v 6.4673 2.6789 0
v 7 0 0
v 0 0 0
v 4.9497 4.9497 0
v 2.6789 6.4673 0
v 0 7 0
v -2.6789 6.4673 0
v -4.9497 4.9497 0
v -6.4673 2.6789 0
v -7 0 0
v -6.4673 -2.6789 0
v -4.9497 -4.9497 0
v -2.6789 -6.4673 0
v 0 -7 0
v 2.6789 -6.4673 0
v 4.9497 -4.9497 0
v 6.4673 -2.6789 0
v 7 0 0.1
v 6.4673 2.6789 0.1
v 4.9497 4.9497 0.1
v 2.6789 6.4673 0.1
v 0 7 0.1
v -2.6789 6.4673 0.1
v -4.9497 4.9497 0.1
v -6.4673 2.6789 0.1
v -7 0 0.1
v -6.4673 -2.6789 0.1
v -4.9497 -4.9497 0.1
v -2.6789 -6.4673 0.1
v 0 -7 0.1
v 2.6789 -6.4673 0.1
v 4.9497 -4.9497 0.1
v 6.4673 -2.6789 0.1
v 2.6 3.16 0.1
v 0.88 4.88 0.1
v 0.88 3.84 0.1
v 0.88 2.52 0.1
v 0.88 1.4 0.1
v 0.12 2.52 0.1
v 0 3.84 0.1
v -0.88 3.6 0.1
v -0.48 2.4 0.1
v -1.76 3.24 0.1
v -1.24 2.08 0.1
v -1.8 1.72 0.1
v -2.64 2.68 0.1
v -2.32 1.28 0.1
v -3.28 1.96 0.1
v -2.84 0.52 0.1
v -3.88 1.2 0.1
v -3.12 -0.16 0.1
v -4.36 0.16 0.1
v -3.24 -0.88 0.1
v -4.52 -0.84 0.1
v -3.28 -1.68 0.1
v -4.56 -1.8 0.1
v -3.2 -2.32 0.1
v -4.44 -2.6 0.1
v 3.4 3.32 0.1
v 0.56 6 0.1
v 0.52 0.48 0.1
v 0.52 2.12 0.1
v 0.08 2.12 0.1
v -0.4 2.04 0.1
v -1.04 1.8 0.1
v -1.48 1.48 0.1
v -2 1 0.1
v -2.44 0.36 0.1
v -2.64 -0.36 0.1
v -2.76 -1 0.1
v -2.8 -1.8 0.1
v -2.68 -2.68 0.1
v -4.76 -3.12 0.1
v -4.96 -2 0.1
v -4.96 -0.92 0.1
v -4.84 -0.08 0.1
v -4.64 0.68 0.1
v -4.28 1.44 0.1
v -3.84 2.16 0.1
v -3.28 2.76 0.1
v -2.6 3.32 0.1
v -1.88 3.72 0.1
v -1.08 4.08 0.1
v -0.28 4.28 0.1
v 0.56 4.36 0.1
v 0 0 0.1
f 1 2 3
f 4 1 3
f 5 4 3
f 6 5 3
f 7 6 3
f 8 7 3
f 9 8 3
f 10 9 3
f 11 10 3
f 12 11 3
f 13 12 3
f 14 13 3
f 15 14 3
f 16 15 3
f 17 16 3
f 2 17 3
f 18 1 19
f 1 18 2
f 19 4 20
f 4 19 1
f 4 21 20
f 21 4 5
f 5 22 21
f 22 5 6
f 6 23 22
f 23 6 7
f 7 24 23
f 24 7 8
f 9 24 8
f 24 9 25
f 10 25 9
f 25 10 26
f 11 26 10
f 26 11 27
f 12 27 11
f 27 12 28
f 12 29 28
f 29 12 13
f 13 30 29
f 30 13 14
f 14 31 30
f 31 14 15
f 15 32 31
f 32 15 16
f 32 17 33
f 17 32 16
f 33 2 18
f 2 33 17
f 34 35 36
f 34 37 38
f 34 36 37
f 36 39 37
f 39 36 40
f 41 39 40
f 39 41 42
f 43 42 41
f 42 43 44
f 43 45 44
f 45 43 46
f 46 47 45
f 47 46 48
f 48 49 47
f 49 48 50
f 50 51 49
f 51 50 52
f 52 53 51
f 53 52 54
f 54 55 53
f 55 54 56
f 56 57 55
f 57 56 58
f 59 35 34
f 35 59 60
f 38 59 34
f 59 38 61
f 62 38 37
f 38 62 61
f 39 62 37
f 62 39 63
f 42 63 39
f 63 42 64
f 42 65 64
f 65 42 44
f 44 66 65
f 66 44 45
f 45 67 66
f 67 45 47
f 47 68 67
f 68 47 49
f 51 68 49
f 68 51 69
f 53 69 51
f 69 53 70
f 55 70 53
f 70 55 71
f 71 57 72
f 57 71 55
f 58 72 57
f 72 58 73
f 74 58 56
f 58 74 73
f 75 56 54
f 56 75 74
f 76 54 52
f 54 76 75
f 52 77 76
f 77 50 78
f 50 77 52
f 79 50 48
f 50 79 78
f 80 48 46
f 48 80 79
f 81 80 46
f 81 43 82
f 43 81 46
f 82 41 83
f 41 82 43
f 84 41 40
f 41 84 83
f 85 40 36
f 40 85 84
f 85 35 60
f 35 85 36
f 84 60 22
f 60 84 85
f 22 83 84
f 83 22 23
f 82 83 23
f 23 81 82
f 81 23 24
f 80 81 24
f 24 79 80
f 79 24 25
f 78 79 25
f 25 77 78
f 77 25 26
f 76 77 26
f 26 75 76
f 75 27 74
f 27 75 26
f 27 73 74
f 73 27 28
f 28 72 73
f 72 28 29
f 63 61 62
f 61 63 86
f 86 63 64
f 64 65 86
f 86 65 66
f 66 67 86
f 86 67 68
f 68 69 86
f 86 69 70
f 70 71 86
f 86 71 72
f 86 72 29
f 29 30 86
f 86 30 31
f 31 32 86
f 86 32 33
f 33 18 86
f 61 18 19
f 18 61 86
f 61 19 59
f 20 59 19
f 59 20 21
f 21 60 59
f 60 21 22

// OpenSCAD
// file: ../p/empty.scad
use <../lib.scad>
function ldraw_lib__empty() = [
// 0 Empty
// 0 Name: empty.dat
// 0 Author: Steffen [Steffen]
// 0 !LDRAW_ORG Primitive UPDATE 2015-01
// 0 !LICENSE Licensed under CC BY 2.0 and CC BY 4.0 : see CAreadme.txt
// 
// 0 BFC CERTIFY CCW
  [0,"BFC","CERTIFY"],
  [0,"BFC","CCW"],
// 
// 0 !HISTORY 2015-10-11 [PTadmin] Official Update 2015-01
// 
// 
// 0 // Tool MLCad cannot handle really empty files. This file is used as a workaround.
// 0 // It exceptionally contains forbidden non-LDRAW standard syntax to satisfy MLCad until it is fixed OR a different editor has become the de-facto LDRAW standard.
// 0 // The line being used here is an "impossible" conditional line which never should be visible,
// 0 // additionally hidden by a syntax explicitly hiding it from displaying.
// 
// 0 MLCAD HIDE 5 24 0 0 0 0.0001 0 0 0.0001 -0.0001 0 0 0 0
];
makepoly(ldraw_lib__empty(), line=0.2);
// file: ../p/1-16chrd.scad
use <../lib.scad>
use <empty.scad>
function ldraw_lib__1_16chrd() = [
// 0 Chord 0.0625
// 0 Name: 1-16chrd.dat
// 0 Author: Philippe Hurbain [Philo]
// 0 !LDRAW_ORG Primitive UPDATE 2015-01
// 0 !LICENSE Licensed under CC BY 2.0 and CC BY 4.0 : see CAreadme.txt
// 
// 0 BFC CERTIFY CCW
  [0,"BFC","CERTIFY"],
  [0,"BFC","CCW"],
// 
// 0 !HISTORY 2015-10-11 [PTadmin] Official Update 2015-01
// 
// 
// 0 // This file is intentionally empty because at the current \P resolution,
// 0 // an 1-16chrd is actually empty. However, this file still is present
// 0 // to allow tools to do primitives substition and fill in a real chrd here,
// 0 // or, if desired, to substitute this with the hi-res 48\1-16chrd.
// 
// 0 // This file is based on an idea by Darats at http://forums.ldraw.org/read.php?19,14500,14500#msg-14500
// 
// 1 16 0 0 0 1 0 0 0 1 0 0 0 1 empty.dat
  [1,16,0,0,0,1,0,0,0,1,0,0,0,1, ldraw_lib__empty()],
];
makepoly(ldraw_lib__1_16chrd(), line=0.2);
// file: ../p/4-4disc.scad
use <../lib.scad>
function ldraw_lib__4_4disc() = [
// 0 Disc 1.0
// 0 Name: 4-4disc.dat
// 0 Author: James Jessiman
// 0 !LDRAW_ORG Primitive UPDATE 2002-02
// 0 !LICENSE Licensed under CC BY 2.0 and CC BY 4.0 : see CAreadme.txt
// 
// 0 BFC CERTIFY CCW
  [0,"BFC","CERTIFY"],
  [0,"BFC","CCW"],
// 
// 0 !HISTORY 1998-12-15 [PTadmin] Official Update 1998-10
// 0 !HISTORY 2002-03-23 [sbliss] Added BFC statement
// 0 !HISTORY 2002-04-25 [PTadmin] Official Update 2002-02
// 0 !HISTORY 2007-06-24 [PTadmin] Header formatted for Contributor Agreement
// 0 !HISTORY 2008-07-01 [PTadmin] Official Update 2008-01
// 
// 
// 3 16 0 0 0 1 0 0 0.9239 0 0.3827
  [3,16,0,0,0,1,0,0,0.9239,0,0.3827],
// 3 16 0 0 0 0.9239 0 0.3827 0.7071 0 0.7071
  [3,16,0,0,0,0.9239,0,0.3827,0.7071,0,0.7071],
// 3 16 0 0 0 0.7071 0 0.7071 0.3827 0 0.9239
  [3,16,0,0,0,0.7071,0,0.7071,0.3827,0,0.9239],
// 3 16 0 0 0 0.3827 0 0.9239 0 0 1
  [3,16,0,0,0,0.3827,0,0.9239,0,0,1],
// 3 16 0 0 0 0 0 1 -0.3827 0 0.9239
  [3,16,0,0,0,0,0,1,-0.3827,0,0.9239],
// 3 16 0 0 0 -0.3827 0 0.9239 -0.7071 0 0.7071
  [3,16,0,0,0,-0.3827,0,0.9239,-0.7071,0,0.7071],
// 3 16 0 0 0 -0.7071 0 0.7071 -0.9239 0 0.3827
  [3,16,0,0,0,-0.7071,0,0.7071,-0.9239,0,0.3827],
// 3 16 0 0 0 -0.9239 0 0.3827 -1 0 -0
  [3,16,0,0,0,-0.9239,0,0.3827,-1,0,-0],
// 3 16 0 0 0 -1 0 -0 -0.9239 0 -0.3827
  [3,16,0,0,0,-1,0,-0,-0.9239,0,-0.3827],
// 3 16 0 0 0 -0.9239 0 -0.3827 -0.7071 0 -0.7071
  [3,16,0,0,0,-0.9239,0,-0.3827,-0.7071,0,-0.7071],
// 3 16 0 0 0 -0.7071 0 -0.7071 -0.3827 0 -0.9239
  [3,16,0,0,0,-0.7071,0,-0.7071,-0.3827,0,-0.9239],
// 3 16 0 0 0 -0.3827 0 -0.9239 0 0 -1
  [3,16,0,0,0,-0.3827,0,-0.9239,0,0,-1],
// 3 16 0 0 0 0 0 -1 0.3827 0 -0.9239
  [3,16,0,0,0,0,0,-1,0.3827,0,-0.9239],
// 3 16 0 0 0 0.3827 0 -0.9239 0.7071 0 -0.7071
  [3,16,0,0,0,0.3827,0,-0.9239,0.7071,0,-0.7071],
// 3 16 0 0 0 0.7071 0 -0.7071 0.9239 0 -0.3827
  [3,16,0,0,0,0.7071,0,-0.7071,0.9239,0,-0.3827],
// 3 16 0 0 0 0.9239 0 -0.3827 1 0 0
  [3,16,0,0,0,0.9239,0,-0.3827,1,0,0],
// 0
];
makepoly(ldraw_lib__4_4disc(), line=0.2);
// file: ../p/4-4cyli.scad
use <../lib.scad>
function ldraw_lib__4_4cyli() = [
// 0 Cylinder 1.0
// 0 Name: 4-4cyli.dat
// 0 Author: James Jessiman
// 0 !LDRAW_ORG Primitive UPDATE 2005-01
// 0 !LICENSE Licensed under CC BY 2.0 and CC BY 4.0 : see CAreadme.txt
// 
// 0 BFC CERTIFY CCW
  [0,"BFC","CERTIFY"],
  [0,"BFC","CCW"],
// 
// 0 !HISTORY 1998-12-15 [PTadmin] Official Update 1998-10
// 0 !HISTORY 2002-03-23 [sbliss] Added BFC statement; merged headers from files in distributions LDraw 0.27 and Complete.
// 0 !HISTORY 2002-04-25 [PTadmin] Official Update 2002-02
// 0 !HISTORY 2004-12-14 [guyvivan] BFC CCW
// 0 !HISTORY 2005-12-28 [PTadmin] Official Update 2005-01
// 0 !HISTORY 2007-06-24 [PTadmin] Header formatted for Contributor Agreement
// 0 !HISTORY 2008-07-01 [PTadmin] Official Update 2008-01
// 
// 
// 4 16 1 1 0 0.9239 1 0.3827 0.9239 0 0.3827 1 0 0
  [4,16,1,1,0,0.9239,1,0.3827,0.9239,0,0.3827,1,0,0],
// 5 24 1 0 0 1 1 0 0.9239 0 0.3827 0.9239 0 -0.3827
  [5,24,1,0,0,1,1,0,0.9239,0,0.3827,0.9239,0,-0.3827],
// 4 16 0.9239 1 0.3827 0.7071 1 0.7071 0.7071 0 0.7071 0.9239 0 0.3827
  [4,16,0.9239,1,0.3827,0.7071,1,0.7071,0.7071,0,0.7071,0.9239,0,0.3827],
// 5 24 0.9239 0 0.3827 0.9239 1 0.3827 0.7071 0 0.7071 1 0 0
  [5,24,0.9239,0,0.3827,0.9239,1,0.3827,0.7071,0,0.7071,1,0,0],
// 4 16 0.7071 1 0.7071 0.3827 1 0.9239 0.3827 0 0.9239 0.7071 0 0.7071
  [4,16,0.7071,1,0.7071,0.3827,1,0.9239,0.3827,0,0.9239,0.7071,0,0.7071],
// 5 24 0.7071 0 0.7071 0.7071 1 0.7071 0.3827 0 0.9239 0.9239 0 0.3827
  [5,24,0.7071,0,0.7071,0.7071,1,0.7071,0.3827,0,0.9239,0.9239,0,0.3827],
// 4 16 0.3827 1 0.9239 0 1 1 0 0 1 0.3827 0 0.9239
  [4,16,0.3827,1,0.9239,0,1,1,0,0,1,0.3827,0,0.9239],
// 5 24 0.3827 0 0.9239 0.3827 1 0.9239 0 0 1 0.7071 0 0.7071
  [5,24,0.3827,0,0.9239,0.3827,1,0.9239,0,0,1,0.7071,0,0.7071],
// 4 16 0 1 1 -0.3827 1 0.9239 -0.3827 0 0.9239 0 0 1
  [4,16,0,1,1,-0.3827,1,0.9239,-0.3827,0,0.9239,0,0,1],
// 5 24 0 0 1 0 1 1 -0.3827 0 0.9239 0.3827 0 0.9239
  [5,24,0,0,1,0,1,1,-0.3827,0,0.9239,0.3827,0,0.9239],
// 4 16 -0.3827 1 0.9239 -0.7071 1 0.7071 -0.7071 0 0.7071 -0.3827 0 0.9239
  [4,16,-0.3827,1,0.9239,-0.7071,1,0.7071,-0.7071,0,0.7071,-0.3827,0,0.9239],
// 5 24 -0.3827 0 0.9239 -0.3827 1 0.9239 -0.7071 0 0.7071 0 0 1
  [5,24,-0.3827,0,0.9239,-0.3827,1,0.9239,-0.7071,0,0.7071,0,0,1],
// 4 16 -0.7071 1 0.7071 -0.9239 1 0.3827 -0.9239 0 0.3827 -0.7071 0 0.7071
  [4,16,-0.7071,1,0.7071,-0.9239,1,0.3827,-0.9239,0,0.3827,-0.7071,0,0.7071],
// 5 24 -0.7071 0 0.7071 -0.7071 1 0.7071 -0.9239 0 0.3827 -0.3827 0 0.9239
  [5,24,-0.7071,0,0.7071,-0.7071,1,0.7071,-0.9239,0,0.3827,-0.3827,0,0.9239],
// 4 16 -0.9239 1 0.3827 -1 1 0 -1 0 0 -0.9239 0 0.3827
  [4,16,-0.9239,1,0.3827,-1,1,0,-1,0,0,-0.9239,0,0.3827],
// 5 24 -0.9239 0 0.3827 -0.9239 1 0.3827 -1 0 0 -0.7071 0 0.7071
  [5,24,-0.9239,0,0.3827,-0.9239,1,0.3827,-1,0,0,-0.7071,0,0.7071],
// 4 16 -1 1 0 -0.9239 1 -0.3827 -0.9239 0 -0.3827 -1 0 0
  [4,16,-1,1,0,-0.9239,1,-0.3827,-0.9239,0,-0.3827,-1,0,0],
// 5 24 -1 0 0 -1 1 0 -0.9239 0 -0.3827 -0.9239 0 0.3827
  [5,24,-1,0,0,-1,1,0,-0.9239,0,-0.3827,-0.9239,0,0.3827],
// 4 16 -0.9239 1 -0.3827 -0.7071 1 -0.7071 -0.7071 0 -0.7071 -0.9239 0 -0.3827
  [4,16,-0.9239,1,-0.3827,-0.7071,1,-0.7071,-0.7071,0,-0.7071,-0.9239,0,-0.3827],
// 5 24 -0.9239 0 -0.3827 -0.9239 1 -0.3827 -0.7071 0 -0.7071 -1 0 0
  [5,24,-0.9239,0,-0.3827,-0.9239,1,-0.3827,-0.7071,0,-0.7071,-1,0,0],
// 4 16 -0.7071 1 -0.7071 -0.3827 1 -0.9239 -0.3827 0 -0.9239 -0.7071 0 -0.7071
  [4,16,-0.7071,1,-0.7071,-0.3827,1,-0.9239,-0.3827,0,-0.9239,-0.7071,0,-0.7071],
// 5 24 -0.7071 0 -0.7071 -0.7071 1 -0.7071 -0.3827 0 -0.9239 -0.9239 0 -0.3827
  [5,24,-0.7071,0,-0.7071,-0.7071,1,-0.7071,-0.3827,0,-0.9239,-0.9239,0,-0.3827],
// 4 16 -0.3827 1 -0.9239 0 1 -1 0 0 -1 -0.3827 0 -0.9239
  [4,16,-0.3827,1,-0.9239,0,1,-1,0,0,-1,-0.3827,0,-0.9239],
// 5 24 -0.3827 0 -0.9239 -0.3827 1 -0.9239 0 0 -1 -0.7071 0 -0.7071
  [5,24,-0.3827,0,-0.9239,-0.3827,1,-0.9239,0,0,-1,-0.7071,0,-0.7071],
// 4 16 0 1 -1 0.3827 1 -0.9239 0.3827 0 -0.9239 0 0 -1
  [4,16,0,1,-1,0.3827,1,-0.9239,0.3827,0,-0.9239,0,0,-1],
// 5 24 0 0 -1 0 1 -1 0.3827 0 -0.9239 -0.3827 0 -0.9239
  [5,24,0,0,-1,0,1,-1,0.3827,0,-0.9239,-0.3827,0,-0.9239],
// 4 16 0.3827 1 -0.9239 0.7071 1 -0.7071 0.7071 0 -0.7071 0.3827 0 -0.9239
  [4,16,0.3827,1,-0.9239,0.7071,1,-0.7071,0.7071,0,-0.7071,0.3827,0,-0.9239],
// 5 24 0.3827 0 -0.9239 0.3827 1 -0.9239 0.7071 0 -0.7071 0 0 -1
  [5,24,0.3827,0,-0.9239,0.3827,1,-0.9239,0.7071,0,-0.7071,0,0,-1],
// 4 16 0.7071 1 -0.7071 0.9239 1 -0.3827 0.9239 0 -0.3827 0.7071 0 -0.7071
  [4,16,0.7071,1,-0.7071,0.9239,1,-0.3827,0.9239,0,-0.3827,0.7071,0,-0.7071],
// 5 24 0.7071 0 -0.7071 0.7071 1 -0.7071 0.9239 0 -0.3827 0.3827 0 -0.9239
  [5,24,0.7071,0,-0.7071,0.7071,1,-0.7071,0.9239,0,-0.3827,0.3827,0,-0.9239],
// 4 16 0.9239 1 -0.3827 1 1 0 1 0 0 0.9239 0 -0.3827
  [4,16,0.9239,1,-0.3827,1,1,0,1,0,0,0.9239,0,-0.3827],
// 5 24 0.9239 0 -0.3827 0.9239 1 -0.3827 1 0 0 0.7071 0 -0.7071
  [5,24,0.9239,0,-0.3827,0.9239,1,-0.3827,1,0,0,0.7071,0,-0.7071],
// 0
];
makepoly(ldraw_lib__4_4cyli(), line=0.2);
// file: ../p/4-4ering.scad
use <../lib.scad>
use <1-16chrd.scad>
function ldraw_lib__4_4ering() = [
// 0 Adapter Ring Triangles to Normal 1.0
// 0 Name: 4-4ering.dat
// 0 Author: Philippe Hurbain [Philo]
// 0 !LDRAW_ORG Primitive UPDATE 2015-01
// 0 !LICENSE Licensed under CC BY 2.0 and CC BY 4.0 : see CAreadme.txt
// 
// 0 BFC CERTIFY CCW
  [0,"BFC","CERTIFY"],
  [0,"BFC","CCW"],
// 
// 0 !HISTORY 2015-10-11 [PTadmin] Official Update 2015-01
// 
// 
// 0 // This file uses 1-16chrd (actually empty). It allows
// 0 // tools to do primitives substition and fill in a ring of chrd here,
// 0 // or, if desired, to substitute this with the hi-res 48\1-16chrd.
// 0 // This file is based on an idea by Darats at http://forums.ldraw.org/read.php?19,14500,14500#msg-14500
// 
// 1 16 0 0 0 1 0 0 0 1 0 0 0 1 1-16chrd.dat
  [1,16,0,0,0,1,0,0,0,1,0,0,0,1, ldraw_lib__1_16chrd()],
// 1 16 0 0 0 0.92388 0 0.38268 0 1 0 -0.38268 0 0.92388 1-16chrd.dat
  [1,16,0,0,0,0.92388,0,0.38268,0,1,0,-0.38268,0,0.92388, ldraw_lib__1_16chrd()],
// 1 16 0 0 0 0.70711 0 0.70711 0 1 0 -0.70711 0 0.70711 1-16chrd.dat
  [1,16,0,0,0,0.70711,0,0.70711,0,1,0,-0.70711,0,0.70711, ldraw_lib__1_16chrd()],
// 1 16 0 0 0 0.38268 0 0.92388 0 1 0 -0.92388 0 0.38268 1-16chrd.dat
  [1,16,0,0,0,0.38268,0,0.92388,0,1,0,-0.92388,0,0.38268, ldraw_lib__1_16chrd()],
// 1 16 0 0 0 0 0 1 0 1 0 -1 0 0 1-16chrd.dat
  [1,16,0,0,0,0,0,1,0,1,0,-1,0,0, ldraw_lib__1_16chrd()],
// 1 16 0 0 0 -0.38268 0 0.92388 0 1 0 -0.92388 0 -0.38268 1-16chrd.dat
  [1,16,0,0,0,-0.38268,0,0.92388,0,1,0,-0.92388,0,-0.38268, ldraw_lib__1_16chrd()],
// 1 16 0 0 0 -0.70711 0 0.70711 0 1 0 -0.70711 0 -0.70711 1-16chrd.dat
  [1,16,0,0,0,-0.70711,0,0.70711,0,1,0,-0.70711,0,-0.70711, ldraw_lib__1_16chrd()],
// 1 16 0 0 0 -0.92388 0 0.38268 0 1 0 -0.38268 0 -0.92388 1-16chrd.dat
  [1,16,0,0,0,-0.92388,0,0.38268,0,1,0,-0.38268,0,-0.92388, ldraw_lib__1_16chrd()],
// 1 16 0 0 0 0 0 -1 0 1 0 1 0 0 1-16chrd.dat
  [1,16,0,0,0,0,0,-1,0,1,0,1,0,0, ldraw_lib__1_16chrd()],
// 1 16 0 0 0 0.38268 0 -0.92388 0 1 0 0.92388 0 0.38268 1-16chrd.dat
  [1,16,0,0,0,0.38268,0,-0.92388,0,1,0,0.92388,0,0.38268, ldraw_lib__1_16chrd()],
// 1 16 0 0 0 0.70711 0 -0.70711 0 1 0 0.70711 0 0.70711 1-16chrd.dat
  [1,16,0,0,0,0.70711,0,-0.70711,0,1,0,0.70711,0,0.70711, ldraw_lib__1_16chrd()],
// 1 16 0 0 0 0.92388 0 -0.38268 0 1 0 0.38268 0 0.92388 1-16chrd.dat
  [1,16,0,0,0,0.92388,0,-0.38268,0,1,0,0.38268,0,0.92388, ldraw_lib__1_16chrd()],
// 1 16 0 0 0 -1 0 0 0 1 0 0 0 -1 1-16chrd.dat
  [1,16,0,0,0,-1,0,0,0,1,0,0,0,-1, ldraw_lib__1_16chrd()],
// 1 16 0 0 0 -0.92388 0 -0.38268 0 1 0 0.38268 0 -0.92388 1-16chrd.dat
  [1,16,0,0,0,-0.92388,0,-0.38268,0,1,0,0.38268,0,-0.92388, ldraw_lib__1_16chrd()],
// 1 16 0 0 0 -0.70711 0 -0.70711 0 1 0 0.70711 0 -0.70711 1-16chrd.dat
  [1,16,0,0,0,-0.70711,0,-0.70711,0,1,0,0.70711,0,-0.70711, ldraw_lib__1_16chrd()],
// 1 16 0 0 0 -0.38268 0 -0.92388 0 1 0 0.92388 0 -0.38268 1-16chrd.dat
  [1,16,0,0,0,-0.38268,0,-0.92388,0,1,0,0.92388,0,-0.38268, ldraw_lib__1_16chrd()],
];
makepoly(ldraw_lib__4_4ering(), line=0.2);
// file: ../p/4-4cylc3.scad
use <../lib.scad>
use <4-4cyli.scad>
use <4-4disc.scad>
function ldraw_lib__4_4cylc3() = [
// 0 Cylinder Closed 1.0 without Top or Bottom Edge Lines
// 0 Name: 4-4cylc3.dat
// 0 Author: Chris Dee [cwdee]
// 0 !LDRAW_ORG Primitive UPDATE 2017-01
// 0 !LICENSE Licensed under CC BY 2.0 and CC BY 4.0 : see CAreadme.txt
// 
// 0 BFC CERTIFY CCW
  [0,"BFC","CERTIFY"],
  [0,"BFC","CCW"],
// 
// 0 !HISTORY 2017-12-30 [PTadmin] Official Update 2017-01
// 
// 
// 1 16 0 0 0 1 0 0 0 1 0 0 0 1 4-4disc.dat
  [1,16,0,0,0,1,0,0,0,1,0,0,0,1, ldraw_lib__4_4disc()],
// 1 16 0 0 0 1 0 0 0 1 0 0 0 1 4-4cyli.dat
  [1,16,0,0,0,1,0,0,0,1,0,0,0,1, ldraw_lib__4_4cyli()],
// 0
];
makepoly(ldraw_lib__4_4cylc3(), line=0.2);
// main file
use <../lib.scad>
use <../p/4-4cylc3.scad>
use <../p/4-4ering.scad>
function ldraw_lib__59826g() = [
// 0 Sticker  1.75 x  1.75 Round with Quarter Circle Arrow
// 0 Name: 59826g.dat
// 0 Author: J.C. Tchang [tchang]
// 0 !LDRAW_ORG Part UPDATE 2018-02
// 0 !LICENSE Licensed under CC BY 2.0 and CC BY 4.0 : see CAreadme.txt
// 
// 0 BFC CERTIFY CW
  [0,"BFC","CERTIFY"],
  [0,"BFC","CW"],
// 
// 0 !HISTORY 2014-06-21 [PTadmin] Official Update 2014-01
// 0 !HISTORY 2017-07-03 [cwdee] Use cylinder primitive with conditional lines
// 0 !HISTORY 2017-08-19 [MagFors] added a 4-4ering
// 0 !HISTORY 2018-12-08 [PTadmin] Official Update 2018-02
// 
// 
// 1 16 0 0 0 17.5 0 0 0 -0.25 0 0 0 17.5 4-4cylc3.dat
  [1,16,0,0,0,17.5,0,0,0,-0.25,0,0,0,17.5, ldraw_lib__4_4cylc3()],
// 
// 3 1 2.2 -0.25 9.6 2.2 -0.25 12.2 6.5 -0.25 7.9
  [3,1,2.2,-0.25,9.6,2.2,-0.25,12.2,6.5,-0.25,7.9],
// 3 1 2.2 -0.25 3.5 2.2 -0.25 6.3 6.5 -0.25 7.9
  [3,1,2.2,-0.25,3.5,2.2,-0.25,6.3,6.5,-0.25,7.9],
// 3 1 2.2 -0.25 6.3 2.2 -0.25 9.6 6.5 -0.25 7.9
  [3,1,2.2,-0.25,6.3,2.2,-0.25,9.6,6.5,-0.25,7.9],
// 4 1 2.2 -0.25 6.3 0.3 -0.25 6.3 0 -0.25 9.6 2.2 -0.25 9.6
  [4,1,2.2,-0.25,6.3,0.3,-0.25,6.3,0,-0.25,9.6,2.2,-0.25,9.6],
// 4 1 0.3 -0.25 6.3 -1.2 -0.25 6 -2.2 -0.25 9 0 -0.25 9.6
  [4,1,0.3,-0.25,6.3,-1.2,-0.25,6,-2.2,-0.25,9,0,-0.25,9.6],
// 4 1 -3.1 -0.25 5.2 -4.4 -0.25 8.1 -2.2 -0.25 9 -1.2 -0.25 6
  [4,1,-3.1,-0.25,5.2,-4.4,-0.25,8.1,-2.2,-0.25,9,-1.2,-0.25,6],
// 4 1 -3.1 -0.25 5.2 -4.5 -0.25 4.3 -6.6 -0.25 6.7 -4.4 -0.25 8.1
  [4,1,-3.1,-0.25,5.2,-4.5,-0.25,4.3,-6.6,-0.25,6.7,-4.4,-0.25,8.1],
// 4 1 -4.5 -0.25 4.3 -5.8 -0.25 3.2 -8.2 -0.25 4.9 -6.6 -0.25 6.7
  [4,1,-4.5,-0.25,4.3,-5.8,-0.25,3.2,-8.2,-0.25,4.9,-6.6,-0.25,6.7],
// 4 1 -7.1 -0.25 1.3 -9.7 -0.25 3 -8.2 -0.25 4.9 -5.8 -0.25 3.2
  [4,1,-7.1,-0.25,1.3,-9.7,-0.25,3,-8.2,-0.25,4.9,-5.8,-0.25,3.2],
// 4 1 -7.8 -0.25 -0.4 -10.9 -0.25 0.4 -9.7 -0.25 3 -7.1 -0.25 1.3
  [4,1,-7.8,-0.25,-0.4,-10.9,-0.25,0.4,-9.7,-0.25,3,-7.1,-0.25,1.3],
// 4 1 -8.1 -0.25 -2.2 -11.3 -0.25 -2.1 -10.9 -0.25 0.4 -7.8 -0.25 -0.4
  [4,1,-8.1,-0.25,-2.2,-11.3,-0.25,-2.1,-10.9,-0.25,0.4,-7.8,-0.25,-0.4],
// 4 1 -8.2 -0.25 -4.2 -11.4 -0.25 -4.5 -11.3 -0.25 -2.1 -8.1 -0.25 -2.2
  [4,1,-8.2,-0.25,-4.2,-11.4,-0.25,-4.5,-11.3,-0.25,-2.1,-8.1,-0.25,-2.2],
// 4 1 -8 -0.25 -5.8 -11.1 -0.25 -6.5 -11.4 -0.25 -4.5 -8.2 -0.25 -4.2
  [4,1,-8,-0.25,-5.8,-11.1,-0.25,-6.5,-11.4,-0.25,-4.5,-8.2,-0.25,-4.2],
// 4 15 8.5 -0.25 8.3 6.5 -0.25 7.9 2.2 -0.25 12.2 1.4 -0.25 15
  [4,15,8.5,-0.25,8.3,6.5,-0.25,7.9,2.2,-0.25,12.2,1.4,-0.25,15],
// 4 15 8.5 -0.25 8.3 1.3 -0.25 1.2 2.2 -0.25 3.5 6.5 -0.25 7.9
  [4,15,8.5,-0.25,8.3,1.3,-0.25,1.2,2.2,-0.25,3.5,6.5,-0.25,7.9],
// 4 15 1.3 -0.25 5.3 2.2 -0.25 6.3 2.2 -0.25 3.5 1.3 -0.25 1.2
  [4,15,1.3,-0.25,5.3,2.2,-0.25,6.3,2.2,-0.25,3.5,1.3,-0.25,1.2],
// 4 15 2.2 -0.25 6.3 1.3 -0.25 5.3 0.2 -0.25 5.3 0.3 -0.25 6.3
  [4,15,2.2,-0.25,6.3,1.3,-0.25,5.3,0.2,-0.25,5.3,0.3,-0.25,6.3],
// 4 15 0.3 -0.25 6.3 0.2 -0.25 5.3 -1 -0.25 5.1 -1.2 -0.25 6
  [4,15,0.3,-0.25,6.3,0.2,-0.25,5.3,-1,-0.25,5.1,-1.2,-0.25,6],
// 4 15 -1 -0.25 5.1 -2.6 -0.25 4.5 -3.1 -0.25 5.2 -1.2 -0.25 6
  [4,15,-1,-0.25,5.1,-2.6,-0.25,4.5,-3.1,-0.25,5.2,-1.2,-0.25,6],
// 4 15 -3.1 -0.25 5.2 -2.6 -0.25 4.5 -3.7 -0.25 3.7 -4.5 -0.25 4.3
  [4,15,-3.1,-0.25,5.2,-2.6,-0.25,4.5,-3.7,-0.25,3.7,-4.5,-0.25,4.3],
// 4 15 -4.5 -0.25 4.3 -3.7 -0.25 3.7 -5 -0.25 2.5 -5.8 -0.25 3.2
  [4,15,-4.5,-0.25,4.3,-3.7,-0.25,3.7,-5,-0.25,2.5,-5.8,-0.25,3.2],
// 4 15 -5.8 -0.25 3.2 -5 -0.25 2.5 -6.1 -0.25 0.9 -7.1 -0.25 1.3
  [4,15,-5.8,-0.25,3.2,-5,-0.25,2.5,-6.1,-0.25,0.9,-7.1,-0.25,1.3],
// 4 15 -7.1 -0.25 1.3 -6.1 -0.25 0.9 -6.6 -0.25 -0.9 -7.8 -0.25 -0.4
  [4,15,-7.1,-0.25,1.3,-6.1,-0.25,0.9,-6.6,-0.25,-0.9,-7.8,-0.25,-0.4],
// 4 15 -7.8 -0.25 -0.4 -6.6 -0.25 -0.9 -6.9 -0.25 -2.5 -8.1 -0.25 -2.2
  [4,15,-7.8,-0.25,-0.4,-6.6,-0.25,-0.9,-6.9,-0.25,-2.5,-8.1,-0.25,-2.2],
// 4 15 -8.1 -0.25 -2.2 -6.9 -0.25 -2.5 -7 -0.25 -4.5 -8.2 -0.25 -4.2
  [4,15,-8.1,-0.25,-2.2,-6.9,-0.25,-2.5,-7,-0.25,-4.5,-8.2,-0.25,-4.2],
// 4 15 -8.2 -0.25 -4.2 -7 -0.25 -4.5 -6.7 -0.25 -6.7 -8 -0.25 -5.8
  [4,15,-8.2,-0.25,-4.2,-7,-0.25,-4.5,-6.7,-0.25,-6.7,-8,-0.25,-5.8],
// 4 15 -8 -0.25 -5.8 -6.7 -0.25 -6.7 -11.9 -0.25 -7.8 -11.1 -0.25 -6.5
  [4,15,-8,-0.25,-5.8,-6.7,-0.25,-6.7,-11.9,-0.25,-7.8,-11.1,-0.25,-6.5],
// 4 15 -11.1 -0.25 -6.5 -11.9 -0.25 -7.8 -12.4 -0.25 -5 -11.4 -0.25 -4.5
  [4,15,-11.1,-0.25,-6.5,-11.9,-0.25,-7.8,-12.4,-0.25,-5,-11.4,-0.25,-4.5],
// 4 15 -11.4 -0.25 -4.5 -12.4 -0.25 -5 -12.4 -0.25 -2.3 -11.3 -0.25 -2.1
  [4,15,-11.4,-0.25,-4.5,-12.4,-0.25,-5,-12.4,-0.25,-2.3,-11.3,-0.25,-2.1],
// 4 15 -11.3 -0.25 -2.1 -12.4 -0.25 -2.3 -12.1 -0.25 -0.2 -10.9 -0.25 0.4
  [4,15,-11.3,-0.25,-2.1,-12.4,-0.25,-2.3,-12.1,-0.25,-0.2,-10.9,-0.25,0.4],
// 3 15 -12.1 -0.25 -0.2 -11.6 -0.25 1.7 -10.9 -0.25 0.4
  [3,15,-12.1,-0.25,-0.2,-11.6,-0.25,1.7,-10.9,-0.25,0.4],
// 4 15 -9.7 -0.25 3 -10.9 -0.25 0.4 -11.6 -0.25 1.7 -10.7 -0.25 3.6
  [4,15,-9.7,-0.25,3,-10.9,-0.25,0.4,-11.6,-0.25,1.7,-10.7,-0.25,3.6],
// 4 15 -8.2 -0.25 4.9 -9.7 -0.25 3 -10.7 -0.25 3.6 -9.6 -0.25 5.4
  [4,15,-8.2,-0.25,4.9,-9.7,-0.25,3,-10.7,-0.25,3.6,-9.6,-0.25,5.4],
// 4 15 -6.6 -0.25 6.7 -8.2 -0.25 4.9 -9.6 -0.25 5.4 -8.2 -0.25 6.9
  [4,15,-6.6,-0.25,6.7,-8.2,-0.25,4.9,-9.6,-0.25,5.4,-8.2,-0.25,6.9],
// 3 15 -6.6 -0.25 6.7 -8.2 -0.25 6.9 -6.5 -0.25 8.3
  [3,15,-6.6,-0.25,6.7,-8.2,-0.25,6.9,-6.5,-0.25,8.3],
// 4 15 -4.4 -0.25 8.1 -6.6 -0.25 6.7 -6.5 -0.25 8.3 -4.7 -0.25 9.3
  [4,15,-4.4,-0.25,8.1,-6.6,-0.25,6.7,-6.5,-0.25,8.3,-4.7,-0.25,9.3],
// 4 15 -2.2 -0.25 9 -4.4 -0.25 8.1 -4.7 -0.25 9.3 -2.7 -0.25 10.2
  [4,15,-2.2,-0.25,9,-4.4,-0.25,8.1,-4.7,-0.25,9.3,-2.7,-0.25,10.2],
// 4 15 0 -0.25 9.6 -2.2 -0.25 9 -2.7 -0.25 10.2 -0.7 -0.25 10.7
  [4,15,0,-0.25,9.6,-2.2,-0.25,9,-2.7,-0.25,10.2,-0.7,-0.25,10.7],
// 4 15 2.2 -0.25 9.6 0 -0.25 9.6 -0.7 -0.25 10.7 1.4 -0.25 10.9
  [4,15,2.2,-0.25,9.6,0,-0.25,9.6,-0.7,-0.25,10.7,1.4,-0.25,10.9],
// 4 15 2.2 -0.25 12.2 2.2 -0.25 9.6 1.4 -0.25 10.9 1.4 -0.25 15
  [4,15,2.2,-0.25,12.2,2.2,-0.25,9.6,1.4,-0.25,10.9,1.4,-0.25,15],
// 4 7 -0.7 -0.25 10.7 0 -0.25 17.5 1.4 -0.25 15 1.4 -0.25 10.9
  [4,7,-0.7,-0.25,10.7,0,-0.25,17.5,1.4,-0.25,15,1.4,-0.25,10.9],
// 4 7 0 -0.25 17.5 -0.7 -0.25 10.7 -2.7 -0.25 10.2 -6.6972 -0.25 16.1682
  [4,7,0,-0.25,17.5,-0.7,-0.25,10.7,-2.7,-0.25,10.2,-6.6972,-0.25,16.1682],
// 3 7 -6.6972 -0.25 16.1682 -2.7 -0.25 10.2 -4.7 -0.25 9.3
  [3,7,-6.6972,-0.25,16.1682,-2.7,-0.25,10.2,-4.7,-0.25,9.3],
// 4 7 -6.6972 -0.25 16.1682 -4.7 -0.25 9.3 -6.5 -0.25 8.3 -12.3743 -0.25 12.3743
  [4,7,-6.6972,-0.25,16.1682,-4.7,-0.25,9.3,-6.5,-0.25,8.3,-12.3743,-0.25,12.3743],
// 3 7 -12.3743 -0.25 12.3743 -6.5 -0.25 8.3 -8.2 -0.25 6.9
  [3,7,-12.3743,-0.25,12.3743,-6.5,-0.25,8.3,-8.2,-0.25,6.9],
// 4 7 -12.3743 -0.25 12.3743 -8.2 -0.25 6.9 -9.6 -0.25 5.4 -16.1682 -0.25 6.6972
  [4,7,-12.3743,-0.25,12.3743,-8.2,-0.25,6.9,-9.6,-0.25,5.4,-16.1682,-0.25,6.6972],
// 3 7 -16.1682 -0.25 6.6972 -9.6 -0.25 5.4 -10.7 -0.25 3.6
  [3,7,-16.1682,-0.25,6.6972,-9.6,-0.25,5.4,-10.7,-0.25,3.6],
// 4 7 -17.5 -0.25 0 -16.1682 -0.25 6.6972 -10.7 -0.25 3.6 -11.6 -0.25 1.7
  [4,7,-17.5,-0.25,0,-16.1682,-0.25,6.6972,-10.7,-0.25,3.6,-11.6,-0.25,1.7],
// 3 7 -17.5 -0.25 0 -11.6 -0.25 1.7 -12.1 -0.25 -0.2
  [3,7,-17.5,-0.25,0,-11.6,-0.25,1.7,-12.1,-0.25,-0.2],
// 3 7 -12.1 -0.25 -0.2 -12.4 -0.25 -2.3 -17.5 -0.25 0
  [3,7,-12.1,-0.25,-0.2,-12.4,-0.25,-2.3,-17.5,-0.25,0],
// 4 7 -16.1682 -0.25 -6.6972 -17.5 -0.25 0 -12.4 -0.25 -2.3 -12.4 -0.25 -5
  [4,7,-16.1682,-0.25,-6.6972,-17.5,-0.25,0,-12.4,-0.25,-2.3,-12.4,-0.25,-5],
// 4 7 -16.1682 -0.25 -6.6972 -12.4 -0.25 -5 -11.9 -0.25 -7.8 -12.3743 -0.25 -12.3743
  [4,7,-16.1682,-0.25,-6.6972,-12.4,-0.25,-5,-11.9,-0.25,-7.8,-12.3743,-0.25,-12.3743],
// 4 7 -6.6972 -0.25 -16.1682 -12.3743 -0.25 -12.3743 -11.9 -0.25 -7.8 -6.7 -0.25 -6.7
  [4,7,-6.6972,-0.25,-16.1682,-12.3743,-0.25,-12.3743,-11.9,-0.25,-7.8,-6.7,-0.25,-6.7],
// 4 7 0.2 -0.25 5.3 1.3 -0.25 5.3 1.3 -0.25 1.2 0 -0.25 0
  [4,7,0.2,-0.25,5.3,1.3,-0.25,5.3,1.3,-0.25,1.2,0,-0.25,0],
// 3 7 -1 -0.25 5.1 0.2 -0.25 5.3 0 -0.25 0
  [3,7,-1,-0.25,5.1,0.2,-0.25,5.3,0,-0.25,0],
// 3 7 0 -0.25 0 -2.6 -0.25 4.5 -1 -0.25 5.1
  [3,7,0,-0.25,0,-2.6,-0.25,4.5,-1,-0.25,5.1],
// 3 7 -3.7 -0.25 3.7 -2.6 -0.25 4.5 0 -0.25 0
  [3,7,-3.7,-0.25,3.7,-2.6,-0.25,4.5,0,-0.25,0],
// 3 7 0 -0.25 0 -5 -0.25 2.5 -3.7 -0.25 3.7
  [3,7,0,-0.25,0,-5,-0.25,2.5,-3.7,-0.25,3.7],
// 3 7 -6.1 -0.25 0.9 -5 -0.25 2.5 0 -0.25 0
  [3,7,-6.1,-0.25,0.9,-5,-0.25,2.5,0,-0.25,0],
// 3 7 0 -0.25 0 -6.6 -0.25 -0.9 -6.1 -0.25 0.9
  [3,7,0,-0.25,0,-6.6,-0.25,-0.9,-6.1,-0.25,0.9],
// 3 7 -6.9 -0.25 -2.5 -6.6 -0.25 -0.9 0 -0.25 0
  [3,7,-6.9,-0.25,-2.5,-6.6,-0.25,-0.9,0,-0.25,0],
// 3 7 0 -0.25 0 -7 -0.25 -4.5 -6.9 -0.25 -2.5
  [3,7,0,-0.25,0,-7,-0.25,-4.5,-6.9,-0.25,-2.5],
// 3 7 -6.7 -0.25 -6.7 -7 -0.25 -4.5 0 -0.25 0
  [3,7,-6.7,-0.25,-6.7,-7,-0.25,-4.5,0,-0.25,0],
// 3 7 -6.6972 -0.25 -16.1682 -6.7 -0.25 -6.7 0 -0.25 0
  [3,7,-6.6972,-0.25,-16.1682,-6.7,-0.25,-6.7,0,-0.25,0],
// 3 7 0 -0.25 0 0 -0.25 -17.5 -6.6972 -0.25 -16.1682
  [3,7,0,-0.25,0,0,-0.25,-17.5,-6.6972,-0.25,-16.1682],
// 3 7 6.6972 -0.25 -16.1682 0 -0.25 -17.5 0 -0.25 0
  [3,7,6.6972,-0.25,-16.1682,0,-0.25,-17.5,0,-0.25,0],
// 3 7 0 -0.25 0 12.3743 -0.25 -12.3743 6.6972 -0.25 -16.1682
  [3,7,0,-0.25,0,12.3743,-0.25,-12.3743,6.6972,-0.25,-16.1682],
// 3 7 16.1682 -0.25 -6.6972 12.3743 -0.25 -12.3743 0 -0.25 0
  [3,7,16.1682,-0.25,-6.6972,12.3743,-0.25,-12.3743,0,-0.25,0],
// 3 7 0 -0.25 0 17.5 -0.25 0 16.1682 -0.25 -6.6972
  [3,7,0,-0.25,0,17.5,-0.25,0,16.1682,-0.25,-6.6972],
// 4 7 1.3 -0.25 1.2 16.1682 -0.25 6.6972 17.5 -0.25 0 0 -0.25 0
  [4,7,1.3,-0.25,1.2,16.1682,-0.25,6.6972,17.5,-0.25,0,0,-0.25,0],
// 3 7 8.5 -0.25 8.3 16.1682 -0.25 6.6972 1.3 -0.25 1.2
  [3,7,8.5,-0.25,8.3,16.1682,-0.25,6.6972,1.3,-0.25,1.2],
// 4 7 6.6972 -0.25 16.1682 12.3743 -0.25 12.3743 16.1682 -0.25 6.6972 8.5 -0.25 8.3
  [4,7,6.6972,-0.25,16.1682,12.3743,-0.25,12.3743,16.1682,-0.25,6.6972,8.5,-0.25,8.3],
// 4 7 8.5 -0.25 8.3 1.4 -0.25 15 0 -0.25 17.5 6.6972 -0.25 16.1682
  [4,7,8.5,-0.25,8.3,1.4,-0.25,15,0,-0.25,17.5,6.6972,-0.25,16.1682],
// 1 7 0 -.25 0 17.5 0 0 0 1 0 0 0 17.5 4-4ering.dat
  [1,7,0,-.25,0,17.5,0,0,0,1,0,0,0,17.5, ldraw_lib__4_4ering()],
];
makepoly(ldraw_lib__59826g(), line=0.2);
